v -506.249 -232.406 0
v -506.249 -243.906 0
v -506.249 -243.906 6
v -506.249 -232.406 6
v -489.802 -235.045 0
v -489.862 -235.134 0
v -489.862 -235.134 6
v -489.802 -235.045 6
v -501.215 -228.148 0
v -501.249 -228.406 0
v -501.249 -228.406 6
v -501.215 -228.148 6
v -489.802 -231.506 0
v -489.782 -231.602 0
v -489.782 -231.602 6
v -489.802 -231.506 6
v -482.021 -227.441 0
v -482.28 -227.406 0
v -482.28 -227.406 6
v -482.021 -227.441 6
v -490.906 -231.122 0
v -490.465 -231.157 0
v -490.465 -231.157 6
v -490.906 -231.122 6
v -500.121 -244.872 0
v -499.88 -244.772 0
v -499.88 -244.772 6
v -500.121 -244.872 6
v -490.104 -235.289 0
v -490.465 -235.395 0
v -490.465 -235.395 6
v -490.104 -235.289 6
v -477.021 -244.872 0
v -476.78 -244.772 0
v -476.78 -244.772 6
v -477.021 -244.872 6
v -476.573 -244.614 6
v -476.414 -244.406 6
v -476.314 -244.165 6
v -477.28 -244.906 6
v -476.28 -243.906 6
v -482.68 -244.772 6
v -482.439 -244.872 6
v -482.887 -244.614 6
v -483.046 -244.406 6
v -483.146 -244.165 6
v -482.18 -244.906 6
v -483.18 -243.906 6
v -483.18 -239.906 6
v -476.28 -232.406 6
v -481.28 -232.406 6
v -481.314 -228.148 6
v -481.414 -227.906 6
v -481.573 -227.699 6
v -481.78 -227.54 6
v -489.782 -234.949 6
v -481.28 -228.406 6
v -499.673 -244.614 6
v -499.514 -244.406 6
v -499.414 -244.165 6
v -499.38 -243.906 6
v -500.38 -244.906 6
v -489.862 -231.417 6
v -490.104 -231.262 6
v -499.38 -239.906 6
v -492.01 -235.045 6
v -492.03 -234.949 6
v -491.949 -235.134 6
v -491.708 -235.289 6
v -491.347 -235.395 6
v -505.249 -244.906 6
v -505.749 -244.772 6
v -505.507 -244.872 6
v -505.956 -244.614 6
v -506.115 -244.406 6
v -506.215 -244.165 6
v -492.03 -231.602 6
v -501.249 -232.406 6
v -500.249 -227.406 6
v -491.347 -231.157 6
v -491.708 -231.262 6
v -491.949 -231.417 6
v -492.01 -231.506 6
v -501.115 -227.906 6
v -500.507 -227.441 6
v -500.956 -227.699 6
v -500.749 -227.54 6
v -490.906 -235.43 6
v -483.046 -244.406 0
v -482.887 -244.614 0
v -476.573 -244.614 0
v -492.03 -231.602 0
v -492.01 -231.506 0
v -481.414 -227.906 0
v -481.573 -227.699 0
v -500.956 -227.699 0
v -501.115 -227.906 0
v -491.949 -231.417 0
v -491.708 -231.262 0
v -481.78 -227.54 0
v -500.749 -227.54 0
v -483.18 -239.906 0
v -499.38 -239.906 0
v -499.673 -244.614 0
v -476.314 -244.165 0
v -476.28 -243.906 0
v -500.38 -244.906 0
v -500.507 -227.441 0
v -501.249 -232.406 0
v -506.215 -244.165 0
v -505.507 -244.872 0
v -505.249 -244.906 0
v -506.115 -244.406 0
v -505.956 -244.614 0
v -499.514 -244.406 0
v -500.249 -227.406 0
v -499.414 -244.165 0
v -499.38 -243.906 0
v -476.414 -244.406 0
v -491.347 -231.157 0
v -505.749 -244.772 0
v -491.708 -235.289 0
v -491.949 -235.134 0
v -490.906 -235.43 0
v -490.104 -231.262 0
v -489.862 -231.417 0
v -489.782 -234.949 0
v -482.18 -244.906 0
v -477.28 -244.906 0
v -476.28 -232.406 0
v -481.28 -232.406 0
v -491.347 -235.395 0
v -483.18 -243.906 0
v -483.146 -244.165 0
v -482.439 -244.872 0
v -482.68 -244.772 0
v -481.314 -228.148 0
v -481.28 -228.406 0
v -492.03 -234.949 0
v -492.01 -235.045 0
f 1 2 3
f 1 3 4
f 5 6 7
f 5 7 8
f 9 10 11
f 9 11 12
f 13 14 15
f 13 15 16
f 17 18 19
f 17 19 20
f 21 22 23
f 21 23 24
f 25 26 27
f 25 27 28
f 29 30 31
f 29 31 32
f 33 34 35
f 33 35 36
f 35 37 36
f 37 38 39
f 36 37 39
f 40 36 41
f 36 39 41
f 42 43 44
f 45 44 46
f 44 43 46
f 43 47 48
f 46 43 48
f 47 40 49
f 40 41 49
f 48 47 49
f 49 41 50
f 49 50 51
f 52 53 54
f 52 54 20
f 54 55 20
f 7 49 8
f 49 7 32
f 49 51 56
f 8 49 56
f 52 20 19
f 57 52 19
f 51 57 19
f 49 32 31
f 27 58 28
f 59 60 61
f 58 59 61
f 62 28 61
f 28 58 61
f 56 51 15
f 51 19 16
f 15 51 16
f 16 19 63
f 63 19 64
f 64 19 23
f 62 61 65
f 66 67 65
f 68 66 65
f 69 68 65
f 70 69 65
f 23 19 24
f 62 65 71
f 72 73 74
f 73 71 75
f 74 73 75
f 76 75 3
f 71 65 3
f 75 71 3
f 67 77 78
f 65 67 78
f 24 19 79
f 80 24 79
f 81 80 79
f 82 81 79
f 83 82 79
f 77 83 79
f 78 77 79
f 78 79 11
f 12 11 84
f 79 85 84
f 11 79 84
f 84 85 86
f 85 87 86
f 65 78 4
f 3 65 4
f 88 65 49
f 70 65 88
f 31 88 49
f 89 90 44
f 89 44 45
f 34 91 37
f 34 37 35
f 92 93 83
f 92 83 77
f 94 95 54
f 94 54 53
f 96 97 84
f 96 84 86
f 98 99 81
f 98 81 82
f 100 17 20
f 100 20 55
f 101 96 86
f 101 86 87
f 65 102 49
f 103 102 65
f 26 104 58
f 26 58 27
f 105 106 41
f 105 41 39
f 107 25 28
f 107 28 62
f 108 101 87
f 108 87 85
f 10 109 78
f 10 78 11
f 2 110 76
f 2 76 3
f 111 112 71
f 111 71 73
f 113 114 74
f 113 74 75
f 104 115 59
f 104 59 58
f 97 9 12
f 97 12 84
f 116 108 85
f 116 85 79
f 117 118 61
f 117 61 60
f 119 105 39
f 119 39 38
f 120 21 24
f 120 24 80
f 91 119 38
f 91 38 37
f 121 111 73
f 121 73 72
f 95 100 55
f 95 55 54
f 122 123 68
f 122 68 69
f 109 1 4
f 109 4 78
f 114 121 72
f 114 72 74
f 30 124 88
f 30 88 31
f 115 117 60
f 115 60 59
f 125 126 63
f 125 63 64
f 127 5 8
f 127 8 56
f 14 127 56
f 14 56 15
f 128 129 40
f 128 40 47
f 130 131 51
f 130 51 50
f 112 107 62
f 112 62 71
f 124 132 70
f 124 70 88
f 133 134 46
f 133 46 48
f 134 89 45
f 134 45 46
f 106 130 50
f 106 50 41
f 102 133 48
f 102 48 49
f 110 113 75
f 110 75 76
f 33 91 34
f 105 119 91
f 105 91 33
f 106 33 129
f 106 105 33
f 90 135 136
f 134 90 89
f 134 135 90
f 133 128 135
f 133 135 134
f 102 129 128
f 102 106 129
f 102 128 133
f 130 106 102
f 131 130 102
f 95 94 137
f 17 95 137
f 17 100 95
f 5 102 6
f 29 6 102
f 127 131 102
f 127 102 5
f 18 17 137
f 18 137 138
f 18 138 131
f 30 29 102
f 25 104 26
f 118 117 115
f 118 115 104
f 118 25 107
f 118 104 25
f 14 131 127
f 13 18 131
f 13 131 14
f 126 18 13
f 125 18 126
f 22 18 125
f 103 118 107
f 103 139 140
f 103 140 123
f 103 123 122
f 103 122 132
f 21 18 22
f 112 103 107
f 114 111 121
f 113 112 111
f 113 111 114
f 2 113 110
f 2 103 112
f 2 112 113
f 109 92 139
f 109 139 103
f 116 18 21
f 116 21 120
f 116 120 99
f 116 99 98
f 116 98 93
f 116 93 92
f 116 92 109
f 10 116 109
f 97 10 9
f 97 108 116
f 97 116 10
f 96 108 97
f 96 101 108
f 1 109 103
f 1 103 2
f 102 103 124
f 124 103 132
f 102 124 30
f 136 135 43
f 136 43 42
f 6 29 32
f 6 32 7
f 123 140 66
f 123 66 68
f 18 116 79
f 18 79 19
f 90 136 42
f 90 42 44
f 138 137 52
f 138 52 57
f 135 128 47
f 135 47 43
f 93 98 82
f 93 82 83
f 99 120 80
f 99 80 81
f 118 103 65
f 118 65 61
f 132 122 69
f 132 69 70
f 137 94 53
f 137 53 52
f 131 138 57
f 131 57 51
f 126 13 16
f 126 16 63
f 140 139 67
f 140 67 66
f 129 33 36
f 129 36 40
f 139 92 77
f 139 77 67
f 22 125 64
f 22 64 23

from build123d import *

# Parameters (mm, degrees)
BOSS_EXTRUDE1_DEPTH = 6


with BuildPart() as part:
    # Sketch1 → Boss-Extrude1 (new body)
    with BuildSketch(Plane.XY):
        Polygon((-477.021328122, -244.872375969), (-477.280147167, -244.906450143), (-482.180147167, -244.906450143), (-482.438966212, -244.872375969), (-482.680147167, -244.772475547), (-482.887253948, -244.613556924), (-483.046172571, -244.406450143), (-483.146072993, -244.165269188), (-483.180147167, -243.906450143), (-483.180147167, -239.906450143), (-499.380142171, -239.906450143), (-499.380142171, -243.906450143), (-499.414216344, -244.165269188), (-499.514116767, -244.406450143), (-499.67303539, -244.613556924), (-499.880142171, -244.772475547), (-500.121323126, -244.872375969), (-500.380142171, -244.906450143), (-505.248606329, -244.906450143), (-505.507425374, -244.872375969), (-505.748606329, -244.772475547), (-505.95571311, -244.613556924), (-506.114631732, -244.406450143), (-506.214532155, -244.165269188), (-506.248606329, -243.906450143), (-506.248606329, -232.406450143), (-501.248606329, -232.406450143), (-501.248606329, -228.406450143), (-501.214532155, -228.147631098), (-501.114631732, -227.906450143), (-500.95571311, -227.699343362), (-500.748606329, -227.540424739), (-500.507425374, -227.440524317), (-500.248606329, -227.406450143), (-482.280147167, -227.406450143), (-482.021328122, -227.440524317), (-481.780147167, -227.540424739), (-481.573040386, -227.699343362), (-481.414121763, -227.906450143), (-481.314221341, -228.147631098), (-481.280147167, -228.406450143), (-481.280147167, -232.406450143), (-476.280147167, -232.406450143), (-476.280147167, -243.906450143), (-476.314221341, -244.165269188), (-476.414121763, -244.406450143), (-476.573040386, -244.613556924), (-476.780147167, -244.772475547), align=None)
        Polygon((-492.029860545, -234.949153278), (-492.009763604, -235.045362548), (-491.949472778, -235.134152325), (-491.708309478, -235.2894734), (-491.346945625, -235.394834966), (-490.905956201, -235.429955488), (-490.464966776, -235.394834966), (-490.103602923, -235.2894734), (-489.862439623, -235.134152325), (-489.802148798, -235.045362548), (-489.782051856, -234.949153278), (-489.782051856, -231.602449772), (-489.802148798, -231.506259854), (-489.862439623, -231.417480498), (-490.103602923, -231.262153468), (-490.464966776, -231.156774038), (-490.905956201, -231.121647561), (-491.346945625, -231.156774038), (-491.708309478, -231.262153468), (-491.949472778, -231.417480498), (-492.009763604, -231.506259854), (-492.029860545, -231.602449772), align=None, mode=Mode.SUBTRACT)
    extrude(amount=BOSS_EXTRUDE1_DEPTH)


solid = part.part
